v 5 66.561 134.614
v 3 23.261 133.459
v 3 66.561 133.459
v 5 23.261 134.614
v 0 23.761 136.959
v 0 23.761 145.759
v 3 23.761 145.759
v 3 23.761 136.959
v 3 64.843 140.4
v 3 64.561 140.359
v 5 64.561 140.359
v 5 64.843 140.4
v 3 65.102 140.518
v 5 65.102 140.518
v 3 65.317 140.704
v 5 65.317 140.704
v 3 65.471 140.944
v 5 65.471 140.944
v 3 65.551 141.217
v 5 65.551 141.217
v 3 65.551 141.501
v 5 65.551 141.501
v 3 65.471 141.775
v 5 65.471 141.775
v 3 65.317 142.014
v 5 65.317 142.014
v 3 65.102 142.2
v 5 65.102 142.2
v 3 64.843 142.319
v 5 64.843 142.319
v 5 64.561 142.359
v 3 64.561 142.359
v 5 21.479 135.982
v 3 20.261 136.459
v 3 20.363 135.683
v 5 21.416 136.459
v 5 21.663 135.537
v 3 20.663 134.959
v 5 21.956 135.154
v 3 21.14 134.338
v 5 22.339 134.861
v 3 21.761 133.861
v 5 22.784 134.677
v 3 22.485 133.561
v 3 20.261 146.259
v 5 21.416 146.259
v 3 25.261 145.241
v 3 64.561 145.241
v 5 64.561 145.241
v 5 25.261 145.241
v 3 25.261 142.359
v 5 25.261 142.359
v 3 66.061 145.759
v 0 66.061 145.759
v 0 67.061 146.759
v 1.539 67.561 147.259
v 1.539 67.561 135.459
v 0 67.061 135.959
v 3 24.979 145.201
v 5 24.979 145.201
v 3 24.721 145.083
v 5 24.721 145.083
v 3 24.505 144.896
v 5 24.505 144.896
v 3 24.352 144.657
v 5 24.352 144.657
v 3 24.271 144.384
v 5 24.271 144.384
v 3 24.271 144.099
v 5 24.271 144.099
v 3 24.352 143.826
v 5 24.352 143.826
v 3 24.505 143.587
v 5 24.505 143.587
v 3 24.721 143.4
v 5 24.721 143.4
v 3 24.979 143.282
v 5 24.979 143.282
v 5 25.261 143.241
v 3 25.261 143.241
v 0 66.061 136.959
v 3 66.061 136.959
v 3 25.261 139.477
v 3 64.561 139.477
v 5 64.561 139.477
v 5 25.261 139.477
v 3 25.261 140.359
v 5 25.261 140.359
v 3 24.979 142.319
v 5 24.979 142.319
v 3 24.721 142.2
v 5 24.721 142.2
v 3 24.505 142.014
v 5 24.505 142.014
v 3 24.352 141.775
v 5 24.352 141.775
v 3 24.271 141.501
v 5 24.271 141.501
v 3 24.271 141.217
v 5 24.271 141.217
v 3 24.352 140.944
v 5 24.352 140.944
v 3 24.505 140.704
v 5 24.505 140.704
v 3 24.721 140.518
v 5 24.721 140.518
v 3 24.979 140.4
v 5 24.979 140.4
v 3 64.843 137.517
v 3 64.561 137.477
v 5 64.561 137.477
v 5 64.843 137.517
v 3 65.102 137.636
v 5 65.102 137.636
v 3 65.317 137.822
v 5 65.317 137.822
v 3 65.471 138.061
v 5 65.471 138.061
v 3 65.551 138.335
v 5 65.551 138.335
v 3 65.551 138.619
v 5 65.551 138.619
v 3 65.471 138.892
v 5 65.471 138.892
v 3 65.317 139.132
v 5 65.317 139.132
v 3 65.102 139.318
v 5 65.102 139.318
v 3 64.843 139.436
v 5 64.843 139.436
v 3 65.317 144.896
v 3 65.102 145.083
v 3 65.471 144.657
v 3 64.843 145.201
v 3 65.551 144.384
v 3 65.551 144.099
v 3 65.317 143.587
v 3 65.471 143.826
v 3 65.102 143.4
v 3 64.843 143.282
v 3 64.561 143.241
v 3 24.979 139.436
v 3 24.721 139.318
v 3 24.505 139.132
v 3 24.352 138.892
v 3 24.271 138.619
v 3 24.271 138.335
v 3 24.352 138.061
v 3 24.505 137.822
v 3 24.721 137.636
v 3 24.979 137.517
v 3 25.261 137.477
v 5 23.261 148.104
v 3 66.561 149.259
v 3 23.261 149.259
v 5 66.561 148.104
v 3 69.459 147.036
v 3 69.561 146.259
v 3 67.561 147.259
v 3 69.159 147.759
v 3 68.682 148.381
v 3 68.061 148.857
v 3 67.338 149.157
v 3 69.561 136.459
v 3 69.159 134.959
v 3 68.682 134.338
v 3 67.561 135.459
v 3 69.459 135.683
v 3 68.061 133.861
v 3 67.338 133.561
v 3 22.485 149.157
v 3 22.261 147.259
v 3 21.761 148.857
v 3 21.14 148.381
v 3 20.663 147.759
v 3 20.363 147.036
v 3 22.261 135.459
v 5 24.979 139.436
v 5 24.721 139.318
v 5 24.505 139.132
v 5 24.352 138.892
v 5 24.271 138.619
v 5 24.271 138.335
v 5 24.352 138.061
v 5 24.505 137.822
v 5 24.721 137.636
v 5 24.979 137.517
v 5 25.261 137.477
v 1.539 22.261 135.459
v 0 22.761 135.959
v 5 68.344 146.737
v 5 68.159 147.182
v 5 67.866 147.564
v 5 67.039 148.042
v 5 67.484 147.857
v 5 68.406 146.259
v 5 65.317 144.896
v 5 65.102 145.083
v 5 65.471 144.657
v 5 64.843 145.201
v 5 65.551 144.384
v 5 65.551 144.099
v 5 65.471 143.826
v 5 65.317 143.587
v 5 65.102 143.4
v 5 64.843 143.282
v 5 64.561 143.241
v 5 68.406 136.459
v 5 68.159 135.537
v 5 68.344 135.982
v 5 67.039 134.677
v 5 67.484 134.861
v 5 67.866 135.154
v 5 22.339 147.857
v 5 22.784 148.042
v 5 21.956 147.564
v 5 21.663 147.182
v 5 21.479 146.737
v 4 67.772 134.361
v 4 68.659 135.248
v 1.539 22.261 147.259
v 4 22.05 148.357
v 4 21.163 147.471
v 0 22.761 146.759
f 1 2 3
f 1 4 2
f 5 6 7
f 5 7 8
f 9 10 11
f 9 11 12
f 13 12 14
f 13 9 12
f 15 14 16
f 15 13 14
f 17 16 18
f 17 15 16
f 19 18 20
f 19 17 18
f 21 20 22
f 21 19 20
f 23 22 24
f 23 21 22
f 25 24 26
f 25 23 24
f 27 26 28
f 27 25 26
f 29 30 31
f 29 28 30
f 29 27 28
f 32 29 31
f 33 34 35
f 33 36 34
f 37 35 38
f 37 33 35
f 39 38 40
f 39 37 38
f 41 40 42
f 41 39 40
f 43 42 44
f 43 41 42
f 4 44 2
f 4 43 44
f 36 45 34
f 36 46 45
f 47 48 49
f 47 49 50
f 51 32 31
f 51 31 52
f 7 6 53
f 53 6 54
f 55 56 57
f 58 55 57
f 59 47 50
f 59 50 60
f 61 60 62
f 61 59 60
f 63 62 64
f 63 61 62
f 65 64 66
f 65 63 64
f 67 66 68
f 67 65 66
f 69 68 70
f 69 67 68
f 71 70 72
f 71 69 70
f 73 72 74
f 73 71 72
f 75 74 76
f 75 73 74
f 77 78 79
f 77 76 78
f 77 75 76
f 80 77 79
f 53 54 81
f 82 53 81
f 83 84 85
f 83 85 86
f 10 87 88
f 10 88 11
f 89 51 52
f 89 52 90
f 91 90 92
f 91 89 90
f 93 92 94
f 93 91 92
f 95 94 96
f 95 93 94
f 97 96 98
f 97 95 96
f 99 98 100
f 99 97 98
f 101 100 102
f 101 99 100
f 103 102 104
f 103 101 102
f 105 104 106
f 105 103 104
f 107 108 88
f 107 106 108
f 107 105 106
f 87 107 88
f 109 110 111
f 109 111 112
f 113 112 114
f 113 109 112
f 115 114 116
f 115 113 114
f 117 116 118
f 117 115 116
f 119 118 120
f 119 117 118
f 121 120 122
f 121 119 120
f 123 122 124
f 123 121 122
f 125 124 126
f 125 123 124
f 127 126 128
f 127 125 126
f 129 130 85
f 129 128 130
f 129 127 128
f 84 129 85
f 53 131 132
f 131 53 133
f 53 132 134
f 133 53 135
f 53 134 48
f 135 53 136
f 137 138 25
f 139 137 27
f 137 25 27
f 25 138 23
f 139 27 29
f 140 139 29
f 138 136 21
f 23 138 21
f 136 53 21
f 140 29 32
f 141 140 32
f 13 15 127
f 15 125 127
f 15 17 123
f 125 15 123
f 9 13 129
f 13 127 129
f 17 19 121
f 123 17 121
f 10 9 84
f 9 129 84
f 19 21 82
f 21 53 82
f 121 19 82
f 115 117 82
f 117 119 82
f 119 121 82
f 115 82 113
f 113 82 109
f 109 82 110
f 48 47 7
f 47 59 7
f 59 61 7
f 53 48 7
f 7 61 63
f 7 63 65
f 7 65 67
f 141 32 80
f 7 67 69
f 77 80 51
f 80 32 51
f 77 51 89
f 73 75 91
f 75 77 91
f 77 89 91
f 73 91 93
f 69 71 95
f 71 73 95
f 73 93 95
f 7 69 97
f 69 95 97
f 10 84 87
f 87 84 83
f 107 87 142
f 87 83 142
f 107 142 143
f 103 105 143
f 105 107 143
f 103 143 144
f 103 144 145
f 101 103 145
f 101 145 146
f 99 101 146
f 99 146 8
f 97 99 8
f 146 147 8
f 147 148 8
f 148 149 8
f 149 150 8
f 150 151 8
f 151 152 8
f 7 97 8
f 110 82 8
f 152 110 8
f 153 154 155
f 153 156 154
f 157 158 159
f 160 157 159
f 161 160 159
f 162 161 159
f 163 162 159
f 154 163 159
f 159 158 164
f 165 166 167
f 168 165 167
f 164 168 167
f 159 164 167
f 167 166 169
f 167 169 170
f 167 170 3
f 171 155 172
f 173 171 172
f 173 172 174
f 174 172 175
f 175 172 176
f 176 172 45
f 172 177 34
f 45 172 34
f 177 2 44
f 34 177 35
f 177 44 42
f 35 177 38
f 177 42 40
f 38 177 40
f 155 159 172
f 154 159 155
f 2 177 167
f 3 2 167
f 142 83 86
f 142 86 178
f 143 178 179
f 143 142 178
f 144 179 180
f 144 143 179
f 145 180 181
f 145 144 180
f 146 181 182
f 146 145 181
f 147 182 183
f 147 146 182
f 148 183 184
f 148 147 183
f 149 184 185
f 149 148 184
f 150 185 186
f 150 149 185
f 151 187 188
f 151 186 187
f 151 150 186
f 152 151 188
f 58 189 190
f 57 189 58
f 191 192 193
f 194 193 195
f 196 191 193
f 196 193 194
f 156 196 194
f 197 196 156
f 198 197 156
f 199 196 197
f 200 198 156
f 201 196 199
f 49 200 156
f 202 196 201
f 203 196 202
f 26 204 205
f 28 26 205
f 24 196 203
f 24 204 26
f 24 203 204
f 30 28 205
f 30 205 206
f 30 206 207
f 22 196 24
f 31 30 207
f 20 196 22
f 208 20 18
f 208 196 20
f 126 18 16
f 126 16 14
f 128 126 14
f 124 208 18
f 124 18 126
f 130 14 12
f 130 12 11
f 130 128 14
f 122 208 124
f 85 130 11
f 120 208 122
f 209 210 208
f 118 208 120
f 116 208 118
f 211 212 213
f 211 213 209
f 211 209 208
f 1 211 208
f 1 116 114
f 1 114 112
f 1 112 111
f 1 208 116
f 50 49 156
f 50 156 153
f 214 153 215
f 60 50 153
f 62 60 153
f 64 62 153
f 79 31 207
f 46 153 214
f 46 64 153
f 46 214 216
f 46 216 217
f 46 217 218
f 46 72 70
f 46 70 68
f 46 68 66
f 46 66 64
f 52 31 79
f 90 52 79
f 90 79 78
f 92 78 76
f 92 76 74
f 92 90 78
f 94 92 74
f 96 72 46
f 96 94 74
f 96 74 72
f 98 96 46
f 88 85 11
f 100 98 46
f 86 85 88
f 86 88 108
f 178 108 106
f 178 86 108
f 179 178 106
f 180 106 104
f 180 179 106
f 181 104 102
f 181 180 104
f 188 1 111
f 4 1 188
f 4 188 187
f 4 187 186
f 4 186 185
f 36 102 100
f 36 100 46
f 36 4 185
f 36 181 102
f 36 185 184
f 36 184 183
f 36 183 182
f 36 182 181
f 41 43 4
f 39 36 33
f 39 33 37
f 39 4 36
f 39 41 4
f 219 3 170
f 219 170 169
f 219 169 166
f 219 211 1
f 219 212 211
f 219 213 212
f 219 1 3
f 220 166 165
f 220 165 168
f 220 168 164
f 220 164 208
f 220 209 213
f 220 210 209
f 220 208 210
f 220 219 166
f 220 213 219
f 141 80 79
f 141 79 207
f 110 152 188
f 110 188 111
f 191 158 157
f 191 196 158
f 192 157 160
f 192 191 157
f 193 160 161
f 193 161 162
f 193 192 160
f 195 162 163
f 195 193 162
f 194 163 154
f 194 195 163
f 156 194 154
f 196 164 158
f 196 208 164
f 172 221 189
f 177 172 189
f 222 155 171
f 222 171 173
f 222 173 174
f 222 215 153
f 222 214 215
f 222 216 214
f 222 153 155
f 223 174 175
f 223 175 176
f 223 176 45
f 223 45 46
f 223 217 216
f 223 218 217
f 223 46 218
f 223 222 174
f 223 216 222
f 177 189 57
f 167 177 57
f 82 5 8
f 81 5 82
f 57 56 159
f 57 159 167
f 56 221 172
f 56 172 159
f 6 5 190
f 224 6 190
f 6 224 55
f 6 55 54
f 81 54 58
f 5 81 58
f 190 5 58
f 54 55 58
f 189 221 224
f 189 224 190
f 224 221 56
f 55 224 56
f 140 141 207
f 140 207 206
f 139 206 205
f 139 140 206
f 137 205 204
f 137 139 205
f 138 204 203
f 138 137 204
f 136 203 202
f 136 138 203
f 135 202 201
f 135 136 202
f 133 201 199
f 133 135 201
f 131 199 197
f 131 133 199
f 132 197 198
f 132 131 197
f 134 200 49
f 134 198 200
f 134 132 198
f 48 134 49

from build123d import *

# Parameters (mm, degrees)
SKETCH_1_W          = 11.8
SKETCH_1_H          = 45.3
SKETCH_1_W_2        = 8.8
SKETCH_1_H_2        = 42.3
EXTRUDE_1_DEPTH     = 3
EXTRUDE_2_DEPTH     = 2
EXTRUDE_2_TAPER     = 30
CUT_EXTRUDE_1_REACH = 4
CHAMFER_1_SIZE      = 0.5
CHAMFER_1_SIZE2     = 1.538841769


with BuildPart() as part:
    # 草图1 → 凸台-拉伸1 (new body)
    with BuildSketch(Plane(origin=(0, 0, 0), x_dir=(0, 0, -1), z_dir=(1, 0, 0))):
        with Locations((-141.359181517, 44.911156128)):
            Rectangle(SKETCH_1_W, SKETCH_1_H)
        with Locations((-141.359181517, 44.911156128)):
            Rectangle(SKETCH_1_W_2, SKETCH_1_H_2, mode=Mode.SUBTRACT)
    extrude(amount=EXTRUDE_1_DEPTH)

    # 草图2 → 凸台-拉伸2 (add)
    with BuildSketch(Plane(origin=(3, 0, 0), x_dir=(0, 0, -1), z_dir=(1, 0, 0))):
        with BuildLine():
            Line((-146.259181517, 20.261156128), (-136.459181517, 20.261156128))
            ThreePointArc((-136.459181517, 20.261156128), (-134.337861173, 21.139835784), (-133.459181517, 23.261156128))
            Line((-133.459181517, 23.261156128), (-133.459181517, 66.561156128))
            ThreePointArc((-133.459181517, 66.561156128), (-134.337861173, 68.682476471), (-136.459181517, 69.561156128))
            Line((-136.459181517, 69.561156128), (-146.259181517, 69.561156128))
            ThreePointArc((-146.259181517, 69.561156128), (-148.38050186, 68.682476471), (-149.259181517, 66.561156128))
            Line((-149.259181517, 66.561156128), (-149.259181517, 23.261156128))
            ThreePointArc((-149.259181517, 23.261156128), (-148.38050186, 21.139835784), (-146.259181517, 20.261156128))
        make_face()
    extrude(amount=EXTRUDE_2_DEPTH, taper=EXTRUDE_2_TAPER)

    # 草图3 → 切除-拉伸1 (cut, up to next)
    with BuildSketch(Plane.ZY.offset(-3), mode=Mode.PRIVATE) as cut_extrude_1_sk1:
        with BuildLine():
            Line((145.241468338, 64.561156128), (145.241468338, 25.261156128))
            ThreePointArc((145.241468338, 25.261156128), (144.241468338, 24.261156128), (143.241468338, 25.261156128))
            Line((143.241468338, 25.261156128), (143.241468338, 64.561156128))
            ThreePointArc((143.241468338, 64.561156128), (144.241468338, 65.561156128), (145.241468338, 64.561156128))
        make_face()
    cut_extrude_1_tool1 = extrude(cut_extrude_1_sk1.sketch, amount=-CUT_EXTRUDE_1_REACH, mode=Mode.PRIVATE) & part.part
    add(cut_extrude_1_tool1.solids().sort_by_distance((3, 44.911156, 144.241468))[0], mode=Mode.SUBTRACT)
    # 草图3 → 切除-拉伸1 (cut, up to next)
    with BuildSketch(Plane.ZY.offset(-3), mode=Mode.PRIVATE) as cut_extrude_1_sk2:
        with BuildLine():
            Line((142.359181517, 64.561156128), (142.359181517, 25.261156128))
            ThreePointArc((142.359181517, 25.261156128), (141.359181517, 24.261156128), (140.359181517, 25.261156128))
            Line((140.359181517, 25.261156128), (140.359181517, 64.561156128))
            ThreePointArc((140.359181517, 64.561156128), (141.359181517, 65.561156128), (142.359181517, 64.561156128))
        make_face()
    cut_extrude_1_tool2 = extrude(cut_extrude_1_sk2.sketch, amount=-CUT_EXTRUDE_1_REACH, mode=Mode.PRIVATE) & part.part
    add(cut_extrude_1_tool2.solids().sort_by_distance((3, 44.911156, 141.359182))[0], mode=Mode.SUBTRACT)
    # 草图3 → 切除-拉伸1 (cut, up to next)
    with BuildSketch(Plane.ZY.offset(-3), mode=Mode.PRIVATE) as cut_extrude_1_sk3:
        with BuildLine():
            Line((139.476894696, 64.561156128), (139.476894696, 25.261156128))
            ThreePointArc((139.476894696, 25.261156128), (138.476894696, 24.261156128), (137.476894696, 25.261156128))
            Line((137.476894696, 25.261156128), (137.476894696, 64.561156128))
            ThreePointArc((137.476894696, 64.561156128), (138.476894696, 65.561156128), (139.476894696, 64.561156128))
        make_face()
    cut_extrude_1_tool3 = extrude(cut_extrude_1_sk3.sketch, amount=-CUT_EXTRUDE_1_REACH, mode=Mode.PRIVATE) & part.part
    add(cut_extrude_1_tool3.solids().sort_by_distance((3, 44.911156, 138.476895))[0], mode=Mode.SUBTRACT)

    # 倒角1
    chamfer_1_edges = [part.edges().sort_by_distance(p)[0] for p in [
        (0, 67.561156128, 141.359181517),
        (0, 44.911156128, 135.459181517),
        (0, 22.261156128, 141.359181517),
        (0, 44.911156128, 147.259181517),
    ]]
    chamfer_1_side = [part.faces().sort_by_distance(p)[0] for p in [
        (0, 67.093039689, 141.359181517),
    ]]
    chamfer(chamfer_1_edges, length=CHAMFER_1_SIZE, length2=CHAMFER_1_SIZE2, reference=chamfer_1_side[0])


solid = part.part
